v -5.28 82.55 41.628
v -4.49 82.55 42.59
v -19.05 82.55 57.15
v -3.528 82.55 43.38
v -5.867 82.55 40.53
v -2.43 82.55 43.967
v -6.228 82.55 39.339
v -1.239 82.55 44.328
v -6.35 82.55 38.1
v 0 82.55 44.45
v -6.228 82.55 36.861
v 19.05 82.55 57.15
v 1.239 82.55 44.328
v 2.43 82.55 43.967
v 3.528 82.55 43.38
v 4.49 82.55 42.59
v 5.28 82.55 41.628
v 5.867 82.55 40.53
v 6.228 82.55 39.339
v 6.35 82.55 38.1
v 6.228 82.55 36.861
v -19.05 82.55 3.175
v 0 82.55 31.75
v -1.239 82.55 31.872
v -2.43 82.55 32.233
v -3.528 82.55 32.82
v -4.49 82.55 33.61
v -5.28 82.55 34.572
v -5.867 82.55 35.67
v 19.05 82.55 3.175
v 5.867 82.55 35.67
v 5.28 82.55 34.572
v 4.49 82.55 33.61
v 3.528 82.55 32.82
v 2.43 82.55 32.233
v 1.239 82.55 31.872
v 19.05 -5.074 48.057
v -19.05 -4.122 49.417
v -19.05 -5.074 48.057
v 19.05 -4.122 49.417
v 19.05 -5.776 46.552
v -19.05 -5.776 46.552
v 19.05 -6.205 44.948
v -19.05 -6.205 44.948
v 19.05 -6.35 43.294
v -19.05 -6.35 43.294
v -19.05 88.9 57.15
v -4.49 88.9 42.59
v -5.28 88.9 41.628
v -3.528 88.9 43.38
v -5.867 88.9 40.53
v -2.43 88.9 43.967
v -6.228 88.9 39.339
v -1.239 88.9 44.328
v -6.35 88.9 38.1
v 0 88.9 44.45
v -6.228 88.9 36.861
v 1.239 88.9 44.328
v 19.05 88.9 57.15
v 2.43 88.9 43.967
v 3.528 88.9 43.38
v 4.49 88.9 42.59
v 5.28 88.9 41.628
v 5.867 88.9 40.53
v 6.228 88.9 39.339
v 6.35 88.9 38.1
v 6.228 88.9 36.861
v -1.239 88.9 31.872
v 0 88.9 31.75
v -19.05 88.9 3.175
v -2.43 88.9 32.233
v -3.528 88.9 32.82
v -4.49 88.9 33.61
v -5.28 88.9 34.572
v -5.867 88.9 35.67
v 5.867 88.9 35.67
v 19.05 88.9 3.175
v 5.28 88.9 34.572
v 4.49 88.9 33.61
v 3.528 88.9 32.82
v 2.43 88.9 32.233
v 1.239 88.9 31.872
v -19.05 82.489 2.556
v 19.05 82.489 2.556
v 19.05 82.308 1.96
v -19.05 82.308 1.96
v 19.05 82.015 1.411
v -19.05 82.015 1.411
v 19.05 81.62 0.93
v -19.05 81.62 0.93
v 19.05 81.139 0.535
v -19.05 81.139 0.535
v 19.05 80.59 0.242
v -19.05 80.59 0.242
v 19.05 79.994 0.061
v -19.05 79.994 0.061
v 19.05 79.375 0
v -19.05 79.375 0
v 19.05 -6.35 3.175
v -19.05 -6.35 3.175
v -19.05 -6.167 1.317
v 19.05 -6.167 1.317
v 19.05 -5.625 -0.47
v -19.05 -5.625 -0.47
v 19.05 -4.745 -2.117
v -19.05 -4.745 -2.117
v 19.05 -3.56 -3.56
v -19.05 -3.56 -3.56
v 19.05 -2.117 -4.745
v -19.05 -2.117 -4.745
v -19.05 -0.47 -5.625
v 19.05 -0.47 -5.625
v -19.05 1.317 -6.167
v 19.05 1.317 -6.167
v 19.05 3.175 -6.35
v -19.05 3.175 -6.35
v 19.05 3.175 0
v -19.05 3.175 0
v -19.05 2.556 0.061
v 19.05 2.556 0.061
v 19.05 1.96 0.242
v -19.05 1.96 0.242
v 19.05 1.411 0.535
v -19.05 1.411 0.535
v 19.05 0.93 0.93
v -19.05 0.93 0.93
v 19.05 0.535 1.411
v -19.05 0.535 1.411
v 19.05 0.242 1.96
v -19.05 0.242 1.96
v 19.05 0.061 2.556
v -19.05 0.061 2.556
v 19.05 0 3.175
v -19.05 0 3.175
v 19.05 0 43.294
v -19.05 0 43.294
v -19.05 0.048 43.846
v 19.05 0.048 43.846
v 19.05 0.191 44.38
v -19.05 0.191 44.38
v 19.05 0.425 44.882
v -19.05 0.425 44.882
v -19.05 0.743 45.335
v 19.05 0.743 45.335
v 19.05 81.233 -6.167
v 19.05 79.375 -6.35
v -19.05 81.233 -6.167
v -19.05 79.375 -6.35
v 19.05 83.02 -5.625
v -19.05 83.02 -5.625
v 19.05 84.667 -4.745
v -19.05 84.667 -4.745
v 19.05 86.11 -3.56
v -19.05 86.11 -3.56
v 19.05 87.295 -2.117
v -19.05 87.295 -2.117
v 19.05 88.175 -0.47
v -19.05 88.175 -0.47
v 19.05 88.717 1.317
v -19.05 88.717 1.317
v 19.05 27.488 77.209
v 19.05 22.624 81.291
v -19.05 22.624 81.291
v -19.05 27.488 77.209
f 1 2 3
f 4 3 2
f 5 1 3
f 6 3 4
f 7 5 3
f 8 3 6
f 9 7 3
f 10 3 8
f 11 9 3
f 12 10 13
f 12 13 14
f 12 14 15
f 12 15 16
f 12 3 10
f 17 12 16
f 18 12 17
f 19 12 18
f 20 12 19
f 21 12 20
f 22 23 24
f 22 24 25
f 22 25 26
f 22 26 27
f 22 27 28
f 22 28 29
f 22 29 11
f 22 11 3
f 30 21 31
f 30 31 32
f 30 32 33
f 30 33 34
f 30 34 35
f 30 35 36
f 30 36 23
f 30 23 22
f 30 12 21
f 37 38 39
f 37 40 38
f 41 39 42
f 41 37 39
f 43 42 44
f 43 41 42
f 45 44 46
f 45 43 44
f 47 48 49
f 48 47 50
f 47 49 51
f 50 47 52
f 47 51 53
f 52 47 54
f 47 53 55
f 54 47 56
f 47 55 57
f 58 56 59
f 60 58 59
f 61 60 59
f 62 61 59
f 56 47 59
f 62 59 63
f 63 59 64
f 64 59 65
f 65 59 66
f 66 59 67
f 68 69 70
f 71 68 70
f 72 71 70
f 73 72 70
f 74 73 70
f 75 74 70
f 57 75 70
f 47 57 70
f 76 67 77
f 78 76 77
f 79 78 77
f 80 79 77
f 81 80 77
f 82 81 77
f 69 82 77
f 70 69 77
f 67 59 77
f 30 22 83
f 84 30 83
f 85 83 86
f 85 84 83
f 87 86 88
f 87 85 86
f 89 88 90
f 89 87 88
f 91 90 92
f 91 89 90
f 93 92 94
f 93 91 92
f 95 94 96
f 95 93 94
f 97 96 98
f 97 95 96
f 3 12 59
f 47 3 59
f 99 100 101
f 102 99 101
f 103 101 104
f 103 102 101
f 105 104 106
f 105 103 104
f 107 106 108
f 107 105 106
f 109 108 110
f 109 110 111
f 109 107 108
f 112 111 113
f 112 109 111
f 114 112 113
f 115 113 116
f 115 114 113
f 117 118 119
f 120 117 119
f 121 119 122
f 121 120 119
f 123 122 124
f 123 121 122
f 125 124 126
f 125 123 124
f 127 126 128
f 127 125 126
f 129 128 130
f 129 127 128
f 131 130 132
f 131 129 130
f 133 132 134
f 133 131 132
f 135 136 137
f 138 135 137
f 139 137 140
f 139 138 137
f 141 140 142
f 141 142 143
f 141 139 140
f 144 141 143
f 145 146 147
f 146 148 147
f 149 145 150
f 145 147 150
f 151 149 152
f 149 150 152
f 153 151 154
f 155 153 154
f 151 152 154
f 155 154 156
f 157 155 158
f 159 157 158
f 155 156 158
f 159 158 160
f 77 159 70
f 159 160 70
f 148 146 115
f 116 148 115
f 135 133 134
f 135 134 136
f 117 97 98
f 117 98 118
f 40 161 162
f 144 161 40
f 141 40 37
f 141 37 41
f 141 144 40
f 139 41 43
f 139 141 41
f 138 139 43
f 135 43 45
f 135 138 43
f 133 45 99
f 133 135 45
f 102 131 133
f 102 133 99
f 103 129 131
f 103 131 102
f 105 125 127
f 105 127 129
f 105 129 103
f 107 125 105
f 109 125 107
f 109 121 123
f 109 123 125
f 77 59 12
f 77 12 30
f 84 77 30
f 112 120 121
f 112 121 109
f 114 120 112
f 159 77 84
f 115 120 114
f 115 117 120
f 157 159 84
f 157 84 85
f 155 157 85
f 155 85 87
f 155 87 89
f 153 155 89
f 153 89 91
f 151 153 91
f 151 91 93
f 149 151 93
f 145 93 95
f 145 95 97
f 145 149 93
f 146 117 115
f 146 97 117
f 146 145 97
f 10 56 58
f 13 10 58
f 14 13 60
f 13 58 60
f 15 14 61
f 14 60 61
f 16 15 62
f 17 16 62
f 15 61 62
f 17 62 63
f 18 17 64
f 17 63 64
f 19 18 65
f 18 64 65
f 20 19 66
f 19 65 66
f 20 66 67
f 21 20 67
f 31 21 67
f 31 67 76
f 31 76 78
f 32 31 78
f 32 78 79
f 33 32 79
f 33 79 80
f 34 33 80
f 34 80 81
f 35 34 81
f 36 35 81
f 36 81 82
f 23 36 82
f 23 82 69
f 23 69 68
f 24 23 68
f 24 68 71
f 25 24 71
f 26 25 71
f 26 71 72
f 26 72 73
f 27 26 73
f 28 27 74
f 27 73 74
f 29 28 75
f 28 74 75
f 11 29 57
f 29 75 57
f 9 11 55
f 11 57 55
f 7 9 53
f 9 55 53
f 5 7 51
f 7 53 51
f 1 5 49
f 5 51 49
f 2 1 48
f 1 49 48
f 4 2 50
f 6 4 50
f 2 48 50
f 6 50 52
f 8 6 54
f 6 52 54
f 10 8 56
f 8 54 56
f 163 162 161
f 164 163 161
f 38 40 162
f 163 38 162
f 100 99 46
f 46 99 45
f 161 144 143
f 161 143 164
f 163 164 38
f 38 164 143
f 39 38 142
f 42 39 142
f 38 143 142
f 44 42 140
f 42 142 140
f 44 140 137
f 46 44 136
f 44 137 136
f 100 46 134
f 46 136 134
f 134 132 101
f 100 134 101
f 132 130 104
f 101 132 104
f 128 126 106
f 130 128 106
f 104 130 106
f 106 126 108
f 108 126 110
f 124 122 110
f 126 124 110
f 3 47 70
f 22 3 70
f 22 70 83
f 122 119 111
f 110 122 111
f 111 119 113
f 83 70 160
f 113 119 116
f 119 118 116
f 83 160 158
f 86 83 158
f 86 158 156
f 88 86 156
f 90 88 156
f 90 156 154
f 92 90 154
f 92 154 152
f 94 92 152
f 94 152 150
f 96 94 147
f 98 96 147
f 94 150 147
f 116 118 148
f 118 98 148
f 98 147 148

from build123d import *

# Parameters (mm, degrees)
BOSS_EXTRUDE1_DEPTH = 19.05
SHELL1_T            = 6.35
FILLET1_R           = 3.175
FILLET2_R           = 9.525
CUT_EXTRUDE1_REACH  = 128.663
SKETCH2_R           = 6.35


with BuildPart() as part:
    # Sketch1 → Boss-Extrude1 (new, symmetric)
    with BuildSketch(Plane(origin=(0, 0, 0), x_dir=(0, 0, -1), z_dir=(1, 0, 0))):
        Polygon((-57.15, 82.55), (0, 82.55), (0, 0), (-44.45, 0), (-77.208974413, 27.488043348), (-57.15, 51.393398168), align=None)
    extrude(amount=BOSS_EXTRUDE1_DEPTH, both=True)

    # Shell1
    shell1_openings = [part.faces().sort_by_distance(p)[0] for p in [
        (19.05, 40.856533518, 31.097326269),
        (0, 39.440720758, 67.179487206),
        (-19.05, 40.856533518, 31.097326269),
        (0, 66.971699084, 57.15),
    ]]
    offset(amount=SHELL1_T, openings=shell1_openings, kind=Kind.INTERSECTION)

    # Fillet1
    # the kernel refuses this fillet: 3.175 mm, written as the material it adds along each edge
    with BuildSketch(Plane(origin=(19.05, 0, 0), x_dir=(0, 0, 1), z_dir=(-1, 0, 0)), Plane(origin=(19.05, 82.55, 0), x_dir=(0, -1, 0), z_dir=(-1, 0, 0))) as fillet1_piece_1:
        with BuildLine():
            CenterArc((FILLET1_R, FILLET1_R), FILLET1_R, 180, 90)
            Line((0, FILLET1_R), (0, 0))
            Line((0, 0), (FILLET1_R, 0))
        make_face()
    extrude(amount=38.1)
    with BuildSketch(Plane(origin=(19.05, 0, 44.45), x_dir=(0, 0.6427876096865391, 0.7660444431189782), z_dir=(-1, 0, 0))) as fillet1_piece_2:
        with BuildLine():
            CenterArc((FILLET1_R * 0.363970234266, FILLET1_R), FILLET1_R, 230, 40)
            Line((-FILLET1_R * 0.27881737542, FILLET1_R * 0.233955556881), (0, 0))
            Line((0, 0), (FILLET1_R * 0.363970234266, 0))
        make_face()
    extrude(amount=38.1)

    # Fillet2
    fillet2_edges = [part.edges().sort_by_distance(p)[0] for p in [
        (0, -6.35, 46.761210988),
        (0, -6.35, -6.35),
        (0, 88.9, -6.35),
    ]]
    fillet(fillet2_edges, radius=FILLET2_R)

    # Sketch2 → Cut-Extrude1 (cut, up to next)
    with BuildSketch(Plane(origin=(0, 88.9, 0), x_dir=(-1, 0, 0), z_dir=(0, 1, 0)), mode=Mode.PRIVATE) as cut_extrude1_sk1:
        with Locations(Location((0, 38.1, 0), (0, 0, 90))):
            Circle(SKETCH2_R)
    cut_extrude1_tool1 = extrude(cut_extrude1_sk1.sketch, amount=-CUT_EXTRUDE1_REACH, mode=Mode.PRIVATE) & part.part
    add(cut_extrude1_tool1.solids().sort_by_distance((0, 88.9, 38.1))[0], mode=Mode.SUBTRACT)


solid = part.part
